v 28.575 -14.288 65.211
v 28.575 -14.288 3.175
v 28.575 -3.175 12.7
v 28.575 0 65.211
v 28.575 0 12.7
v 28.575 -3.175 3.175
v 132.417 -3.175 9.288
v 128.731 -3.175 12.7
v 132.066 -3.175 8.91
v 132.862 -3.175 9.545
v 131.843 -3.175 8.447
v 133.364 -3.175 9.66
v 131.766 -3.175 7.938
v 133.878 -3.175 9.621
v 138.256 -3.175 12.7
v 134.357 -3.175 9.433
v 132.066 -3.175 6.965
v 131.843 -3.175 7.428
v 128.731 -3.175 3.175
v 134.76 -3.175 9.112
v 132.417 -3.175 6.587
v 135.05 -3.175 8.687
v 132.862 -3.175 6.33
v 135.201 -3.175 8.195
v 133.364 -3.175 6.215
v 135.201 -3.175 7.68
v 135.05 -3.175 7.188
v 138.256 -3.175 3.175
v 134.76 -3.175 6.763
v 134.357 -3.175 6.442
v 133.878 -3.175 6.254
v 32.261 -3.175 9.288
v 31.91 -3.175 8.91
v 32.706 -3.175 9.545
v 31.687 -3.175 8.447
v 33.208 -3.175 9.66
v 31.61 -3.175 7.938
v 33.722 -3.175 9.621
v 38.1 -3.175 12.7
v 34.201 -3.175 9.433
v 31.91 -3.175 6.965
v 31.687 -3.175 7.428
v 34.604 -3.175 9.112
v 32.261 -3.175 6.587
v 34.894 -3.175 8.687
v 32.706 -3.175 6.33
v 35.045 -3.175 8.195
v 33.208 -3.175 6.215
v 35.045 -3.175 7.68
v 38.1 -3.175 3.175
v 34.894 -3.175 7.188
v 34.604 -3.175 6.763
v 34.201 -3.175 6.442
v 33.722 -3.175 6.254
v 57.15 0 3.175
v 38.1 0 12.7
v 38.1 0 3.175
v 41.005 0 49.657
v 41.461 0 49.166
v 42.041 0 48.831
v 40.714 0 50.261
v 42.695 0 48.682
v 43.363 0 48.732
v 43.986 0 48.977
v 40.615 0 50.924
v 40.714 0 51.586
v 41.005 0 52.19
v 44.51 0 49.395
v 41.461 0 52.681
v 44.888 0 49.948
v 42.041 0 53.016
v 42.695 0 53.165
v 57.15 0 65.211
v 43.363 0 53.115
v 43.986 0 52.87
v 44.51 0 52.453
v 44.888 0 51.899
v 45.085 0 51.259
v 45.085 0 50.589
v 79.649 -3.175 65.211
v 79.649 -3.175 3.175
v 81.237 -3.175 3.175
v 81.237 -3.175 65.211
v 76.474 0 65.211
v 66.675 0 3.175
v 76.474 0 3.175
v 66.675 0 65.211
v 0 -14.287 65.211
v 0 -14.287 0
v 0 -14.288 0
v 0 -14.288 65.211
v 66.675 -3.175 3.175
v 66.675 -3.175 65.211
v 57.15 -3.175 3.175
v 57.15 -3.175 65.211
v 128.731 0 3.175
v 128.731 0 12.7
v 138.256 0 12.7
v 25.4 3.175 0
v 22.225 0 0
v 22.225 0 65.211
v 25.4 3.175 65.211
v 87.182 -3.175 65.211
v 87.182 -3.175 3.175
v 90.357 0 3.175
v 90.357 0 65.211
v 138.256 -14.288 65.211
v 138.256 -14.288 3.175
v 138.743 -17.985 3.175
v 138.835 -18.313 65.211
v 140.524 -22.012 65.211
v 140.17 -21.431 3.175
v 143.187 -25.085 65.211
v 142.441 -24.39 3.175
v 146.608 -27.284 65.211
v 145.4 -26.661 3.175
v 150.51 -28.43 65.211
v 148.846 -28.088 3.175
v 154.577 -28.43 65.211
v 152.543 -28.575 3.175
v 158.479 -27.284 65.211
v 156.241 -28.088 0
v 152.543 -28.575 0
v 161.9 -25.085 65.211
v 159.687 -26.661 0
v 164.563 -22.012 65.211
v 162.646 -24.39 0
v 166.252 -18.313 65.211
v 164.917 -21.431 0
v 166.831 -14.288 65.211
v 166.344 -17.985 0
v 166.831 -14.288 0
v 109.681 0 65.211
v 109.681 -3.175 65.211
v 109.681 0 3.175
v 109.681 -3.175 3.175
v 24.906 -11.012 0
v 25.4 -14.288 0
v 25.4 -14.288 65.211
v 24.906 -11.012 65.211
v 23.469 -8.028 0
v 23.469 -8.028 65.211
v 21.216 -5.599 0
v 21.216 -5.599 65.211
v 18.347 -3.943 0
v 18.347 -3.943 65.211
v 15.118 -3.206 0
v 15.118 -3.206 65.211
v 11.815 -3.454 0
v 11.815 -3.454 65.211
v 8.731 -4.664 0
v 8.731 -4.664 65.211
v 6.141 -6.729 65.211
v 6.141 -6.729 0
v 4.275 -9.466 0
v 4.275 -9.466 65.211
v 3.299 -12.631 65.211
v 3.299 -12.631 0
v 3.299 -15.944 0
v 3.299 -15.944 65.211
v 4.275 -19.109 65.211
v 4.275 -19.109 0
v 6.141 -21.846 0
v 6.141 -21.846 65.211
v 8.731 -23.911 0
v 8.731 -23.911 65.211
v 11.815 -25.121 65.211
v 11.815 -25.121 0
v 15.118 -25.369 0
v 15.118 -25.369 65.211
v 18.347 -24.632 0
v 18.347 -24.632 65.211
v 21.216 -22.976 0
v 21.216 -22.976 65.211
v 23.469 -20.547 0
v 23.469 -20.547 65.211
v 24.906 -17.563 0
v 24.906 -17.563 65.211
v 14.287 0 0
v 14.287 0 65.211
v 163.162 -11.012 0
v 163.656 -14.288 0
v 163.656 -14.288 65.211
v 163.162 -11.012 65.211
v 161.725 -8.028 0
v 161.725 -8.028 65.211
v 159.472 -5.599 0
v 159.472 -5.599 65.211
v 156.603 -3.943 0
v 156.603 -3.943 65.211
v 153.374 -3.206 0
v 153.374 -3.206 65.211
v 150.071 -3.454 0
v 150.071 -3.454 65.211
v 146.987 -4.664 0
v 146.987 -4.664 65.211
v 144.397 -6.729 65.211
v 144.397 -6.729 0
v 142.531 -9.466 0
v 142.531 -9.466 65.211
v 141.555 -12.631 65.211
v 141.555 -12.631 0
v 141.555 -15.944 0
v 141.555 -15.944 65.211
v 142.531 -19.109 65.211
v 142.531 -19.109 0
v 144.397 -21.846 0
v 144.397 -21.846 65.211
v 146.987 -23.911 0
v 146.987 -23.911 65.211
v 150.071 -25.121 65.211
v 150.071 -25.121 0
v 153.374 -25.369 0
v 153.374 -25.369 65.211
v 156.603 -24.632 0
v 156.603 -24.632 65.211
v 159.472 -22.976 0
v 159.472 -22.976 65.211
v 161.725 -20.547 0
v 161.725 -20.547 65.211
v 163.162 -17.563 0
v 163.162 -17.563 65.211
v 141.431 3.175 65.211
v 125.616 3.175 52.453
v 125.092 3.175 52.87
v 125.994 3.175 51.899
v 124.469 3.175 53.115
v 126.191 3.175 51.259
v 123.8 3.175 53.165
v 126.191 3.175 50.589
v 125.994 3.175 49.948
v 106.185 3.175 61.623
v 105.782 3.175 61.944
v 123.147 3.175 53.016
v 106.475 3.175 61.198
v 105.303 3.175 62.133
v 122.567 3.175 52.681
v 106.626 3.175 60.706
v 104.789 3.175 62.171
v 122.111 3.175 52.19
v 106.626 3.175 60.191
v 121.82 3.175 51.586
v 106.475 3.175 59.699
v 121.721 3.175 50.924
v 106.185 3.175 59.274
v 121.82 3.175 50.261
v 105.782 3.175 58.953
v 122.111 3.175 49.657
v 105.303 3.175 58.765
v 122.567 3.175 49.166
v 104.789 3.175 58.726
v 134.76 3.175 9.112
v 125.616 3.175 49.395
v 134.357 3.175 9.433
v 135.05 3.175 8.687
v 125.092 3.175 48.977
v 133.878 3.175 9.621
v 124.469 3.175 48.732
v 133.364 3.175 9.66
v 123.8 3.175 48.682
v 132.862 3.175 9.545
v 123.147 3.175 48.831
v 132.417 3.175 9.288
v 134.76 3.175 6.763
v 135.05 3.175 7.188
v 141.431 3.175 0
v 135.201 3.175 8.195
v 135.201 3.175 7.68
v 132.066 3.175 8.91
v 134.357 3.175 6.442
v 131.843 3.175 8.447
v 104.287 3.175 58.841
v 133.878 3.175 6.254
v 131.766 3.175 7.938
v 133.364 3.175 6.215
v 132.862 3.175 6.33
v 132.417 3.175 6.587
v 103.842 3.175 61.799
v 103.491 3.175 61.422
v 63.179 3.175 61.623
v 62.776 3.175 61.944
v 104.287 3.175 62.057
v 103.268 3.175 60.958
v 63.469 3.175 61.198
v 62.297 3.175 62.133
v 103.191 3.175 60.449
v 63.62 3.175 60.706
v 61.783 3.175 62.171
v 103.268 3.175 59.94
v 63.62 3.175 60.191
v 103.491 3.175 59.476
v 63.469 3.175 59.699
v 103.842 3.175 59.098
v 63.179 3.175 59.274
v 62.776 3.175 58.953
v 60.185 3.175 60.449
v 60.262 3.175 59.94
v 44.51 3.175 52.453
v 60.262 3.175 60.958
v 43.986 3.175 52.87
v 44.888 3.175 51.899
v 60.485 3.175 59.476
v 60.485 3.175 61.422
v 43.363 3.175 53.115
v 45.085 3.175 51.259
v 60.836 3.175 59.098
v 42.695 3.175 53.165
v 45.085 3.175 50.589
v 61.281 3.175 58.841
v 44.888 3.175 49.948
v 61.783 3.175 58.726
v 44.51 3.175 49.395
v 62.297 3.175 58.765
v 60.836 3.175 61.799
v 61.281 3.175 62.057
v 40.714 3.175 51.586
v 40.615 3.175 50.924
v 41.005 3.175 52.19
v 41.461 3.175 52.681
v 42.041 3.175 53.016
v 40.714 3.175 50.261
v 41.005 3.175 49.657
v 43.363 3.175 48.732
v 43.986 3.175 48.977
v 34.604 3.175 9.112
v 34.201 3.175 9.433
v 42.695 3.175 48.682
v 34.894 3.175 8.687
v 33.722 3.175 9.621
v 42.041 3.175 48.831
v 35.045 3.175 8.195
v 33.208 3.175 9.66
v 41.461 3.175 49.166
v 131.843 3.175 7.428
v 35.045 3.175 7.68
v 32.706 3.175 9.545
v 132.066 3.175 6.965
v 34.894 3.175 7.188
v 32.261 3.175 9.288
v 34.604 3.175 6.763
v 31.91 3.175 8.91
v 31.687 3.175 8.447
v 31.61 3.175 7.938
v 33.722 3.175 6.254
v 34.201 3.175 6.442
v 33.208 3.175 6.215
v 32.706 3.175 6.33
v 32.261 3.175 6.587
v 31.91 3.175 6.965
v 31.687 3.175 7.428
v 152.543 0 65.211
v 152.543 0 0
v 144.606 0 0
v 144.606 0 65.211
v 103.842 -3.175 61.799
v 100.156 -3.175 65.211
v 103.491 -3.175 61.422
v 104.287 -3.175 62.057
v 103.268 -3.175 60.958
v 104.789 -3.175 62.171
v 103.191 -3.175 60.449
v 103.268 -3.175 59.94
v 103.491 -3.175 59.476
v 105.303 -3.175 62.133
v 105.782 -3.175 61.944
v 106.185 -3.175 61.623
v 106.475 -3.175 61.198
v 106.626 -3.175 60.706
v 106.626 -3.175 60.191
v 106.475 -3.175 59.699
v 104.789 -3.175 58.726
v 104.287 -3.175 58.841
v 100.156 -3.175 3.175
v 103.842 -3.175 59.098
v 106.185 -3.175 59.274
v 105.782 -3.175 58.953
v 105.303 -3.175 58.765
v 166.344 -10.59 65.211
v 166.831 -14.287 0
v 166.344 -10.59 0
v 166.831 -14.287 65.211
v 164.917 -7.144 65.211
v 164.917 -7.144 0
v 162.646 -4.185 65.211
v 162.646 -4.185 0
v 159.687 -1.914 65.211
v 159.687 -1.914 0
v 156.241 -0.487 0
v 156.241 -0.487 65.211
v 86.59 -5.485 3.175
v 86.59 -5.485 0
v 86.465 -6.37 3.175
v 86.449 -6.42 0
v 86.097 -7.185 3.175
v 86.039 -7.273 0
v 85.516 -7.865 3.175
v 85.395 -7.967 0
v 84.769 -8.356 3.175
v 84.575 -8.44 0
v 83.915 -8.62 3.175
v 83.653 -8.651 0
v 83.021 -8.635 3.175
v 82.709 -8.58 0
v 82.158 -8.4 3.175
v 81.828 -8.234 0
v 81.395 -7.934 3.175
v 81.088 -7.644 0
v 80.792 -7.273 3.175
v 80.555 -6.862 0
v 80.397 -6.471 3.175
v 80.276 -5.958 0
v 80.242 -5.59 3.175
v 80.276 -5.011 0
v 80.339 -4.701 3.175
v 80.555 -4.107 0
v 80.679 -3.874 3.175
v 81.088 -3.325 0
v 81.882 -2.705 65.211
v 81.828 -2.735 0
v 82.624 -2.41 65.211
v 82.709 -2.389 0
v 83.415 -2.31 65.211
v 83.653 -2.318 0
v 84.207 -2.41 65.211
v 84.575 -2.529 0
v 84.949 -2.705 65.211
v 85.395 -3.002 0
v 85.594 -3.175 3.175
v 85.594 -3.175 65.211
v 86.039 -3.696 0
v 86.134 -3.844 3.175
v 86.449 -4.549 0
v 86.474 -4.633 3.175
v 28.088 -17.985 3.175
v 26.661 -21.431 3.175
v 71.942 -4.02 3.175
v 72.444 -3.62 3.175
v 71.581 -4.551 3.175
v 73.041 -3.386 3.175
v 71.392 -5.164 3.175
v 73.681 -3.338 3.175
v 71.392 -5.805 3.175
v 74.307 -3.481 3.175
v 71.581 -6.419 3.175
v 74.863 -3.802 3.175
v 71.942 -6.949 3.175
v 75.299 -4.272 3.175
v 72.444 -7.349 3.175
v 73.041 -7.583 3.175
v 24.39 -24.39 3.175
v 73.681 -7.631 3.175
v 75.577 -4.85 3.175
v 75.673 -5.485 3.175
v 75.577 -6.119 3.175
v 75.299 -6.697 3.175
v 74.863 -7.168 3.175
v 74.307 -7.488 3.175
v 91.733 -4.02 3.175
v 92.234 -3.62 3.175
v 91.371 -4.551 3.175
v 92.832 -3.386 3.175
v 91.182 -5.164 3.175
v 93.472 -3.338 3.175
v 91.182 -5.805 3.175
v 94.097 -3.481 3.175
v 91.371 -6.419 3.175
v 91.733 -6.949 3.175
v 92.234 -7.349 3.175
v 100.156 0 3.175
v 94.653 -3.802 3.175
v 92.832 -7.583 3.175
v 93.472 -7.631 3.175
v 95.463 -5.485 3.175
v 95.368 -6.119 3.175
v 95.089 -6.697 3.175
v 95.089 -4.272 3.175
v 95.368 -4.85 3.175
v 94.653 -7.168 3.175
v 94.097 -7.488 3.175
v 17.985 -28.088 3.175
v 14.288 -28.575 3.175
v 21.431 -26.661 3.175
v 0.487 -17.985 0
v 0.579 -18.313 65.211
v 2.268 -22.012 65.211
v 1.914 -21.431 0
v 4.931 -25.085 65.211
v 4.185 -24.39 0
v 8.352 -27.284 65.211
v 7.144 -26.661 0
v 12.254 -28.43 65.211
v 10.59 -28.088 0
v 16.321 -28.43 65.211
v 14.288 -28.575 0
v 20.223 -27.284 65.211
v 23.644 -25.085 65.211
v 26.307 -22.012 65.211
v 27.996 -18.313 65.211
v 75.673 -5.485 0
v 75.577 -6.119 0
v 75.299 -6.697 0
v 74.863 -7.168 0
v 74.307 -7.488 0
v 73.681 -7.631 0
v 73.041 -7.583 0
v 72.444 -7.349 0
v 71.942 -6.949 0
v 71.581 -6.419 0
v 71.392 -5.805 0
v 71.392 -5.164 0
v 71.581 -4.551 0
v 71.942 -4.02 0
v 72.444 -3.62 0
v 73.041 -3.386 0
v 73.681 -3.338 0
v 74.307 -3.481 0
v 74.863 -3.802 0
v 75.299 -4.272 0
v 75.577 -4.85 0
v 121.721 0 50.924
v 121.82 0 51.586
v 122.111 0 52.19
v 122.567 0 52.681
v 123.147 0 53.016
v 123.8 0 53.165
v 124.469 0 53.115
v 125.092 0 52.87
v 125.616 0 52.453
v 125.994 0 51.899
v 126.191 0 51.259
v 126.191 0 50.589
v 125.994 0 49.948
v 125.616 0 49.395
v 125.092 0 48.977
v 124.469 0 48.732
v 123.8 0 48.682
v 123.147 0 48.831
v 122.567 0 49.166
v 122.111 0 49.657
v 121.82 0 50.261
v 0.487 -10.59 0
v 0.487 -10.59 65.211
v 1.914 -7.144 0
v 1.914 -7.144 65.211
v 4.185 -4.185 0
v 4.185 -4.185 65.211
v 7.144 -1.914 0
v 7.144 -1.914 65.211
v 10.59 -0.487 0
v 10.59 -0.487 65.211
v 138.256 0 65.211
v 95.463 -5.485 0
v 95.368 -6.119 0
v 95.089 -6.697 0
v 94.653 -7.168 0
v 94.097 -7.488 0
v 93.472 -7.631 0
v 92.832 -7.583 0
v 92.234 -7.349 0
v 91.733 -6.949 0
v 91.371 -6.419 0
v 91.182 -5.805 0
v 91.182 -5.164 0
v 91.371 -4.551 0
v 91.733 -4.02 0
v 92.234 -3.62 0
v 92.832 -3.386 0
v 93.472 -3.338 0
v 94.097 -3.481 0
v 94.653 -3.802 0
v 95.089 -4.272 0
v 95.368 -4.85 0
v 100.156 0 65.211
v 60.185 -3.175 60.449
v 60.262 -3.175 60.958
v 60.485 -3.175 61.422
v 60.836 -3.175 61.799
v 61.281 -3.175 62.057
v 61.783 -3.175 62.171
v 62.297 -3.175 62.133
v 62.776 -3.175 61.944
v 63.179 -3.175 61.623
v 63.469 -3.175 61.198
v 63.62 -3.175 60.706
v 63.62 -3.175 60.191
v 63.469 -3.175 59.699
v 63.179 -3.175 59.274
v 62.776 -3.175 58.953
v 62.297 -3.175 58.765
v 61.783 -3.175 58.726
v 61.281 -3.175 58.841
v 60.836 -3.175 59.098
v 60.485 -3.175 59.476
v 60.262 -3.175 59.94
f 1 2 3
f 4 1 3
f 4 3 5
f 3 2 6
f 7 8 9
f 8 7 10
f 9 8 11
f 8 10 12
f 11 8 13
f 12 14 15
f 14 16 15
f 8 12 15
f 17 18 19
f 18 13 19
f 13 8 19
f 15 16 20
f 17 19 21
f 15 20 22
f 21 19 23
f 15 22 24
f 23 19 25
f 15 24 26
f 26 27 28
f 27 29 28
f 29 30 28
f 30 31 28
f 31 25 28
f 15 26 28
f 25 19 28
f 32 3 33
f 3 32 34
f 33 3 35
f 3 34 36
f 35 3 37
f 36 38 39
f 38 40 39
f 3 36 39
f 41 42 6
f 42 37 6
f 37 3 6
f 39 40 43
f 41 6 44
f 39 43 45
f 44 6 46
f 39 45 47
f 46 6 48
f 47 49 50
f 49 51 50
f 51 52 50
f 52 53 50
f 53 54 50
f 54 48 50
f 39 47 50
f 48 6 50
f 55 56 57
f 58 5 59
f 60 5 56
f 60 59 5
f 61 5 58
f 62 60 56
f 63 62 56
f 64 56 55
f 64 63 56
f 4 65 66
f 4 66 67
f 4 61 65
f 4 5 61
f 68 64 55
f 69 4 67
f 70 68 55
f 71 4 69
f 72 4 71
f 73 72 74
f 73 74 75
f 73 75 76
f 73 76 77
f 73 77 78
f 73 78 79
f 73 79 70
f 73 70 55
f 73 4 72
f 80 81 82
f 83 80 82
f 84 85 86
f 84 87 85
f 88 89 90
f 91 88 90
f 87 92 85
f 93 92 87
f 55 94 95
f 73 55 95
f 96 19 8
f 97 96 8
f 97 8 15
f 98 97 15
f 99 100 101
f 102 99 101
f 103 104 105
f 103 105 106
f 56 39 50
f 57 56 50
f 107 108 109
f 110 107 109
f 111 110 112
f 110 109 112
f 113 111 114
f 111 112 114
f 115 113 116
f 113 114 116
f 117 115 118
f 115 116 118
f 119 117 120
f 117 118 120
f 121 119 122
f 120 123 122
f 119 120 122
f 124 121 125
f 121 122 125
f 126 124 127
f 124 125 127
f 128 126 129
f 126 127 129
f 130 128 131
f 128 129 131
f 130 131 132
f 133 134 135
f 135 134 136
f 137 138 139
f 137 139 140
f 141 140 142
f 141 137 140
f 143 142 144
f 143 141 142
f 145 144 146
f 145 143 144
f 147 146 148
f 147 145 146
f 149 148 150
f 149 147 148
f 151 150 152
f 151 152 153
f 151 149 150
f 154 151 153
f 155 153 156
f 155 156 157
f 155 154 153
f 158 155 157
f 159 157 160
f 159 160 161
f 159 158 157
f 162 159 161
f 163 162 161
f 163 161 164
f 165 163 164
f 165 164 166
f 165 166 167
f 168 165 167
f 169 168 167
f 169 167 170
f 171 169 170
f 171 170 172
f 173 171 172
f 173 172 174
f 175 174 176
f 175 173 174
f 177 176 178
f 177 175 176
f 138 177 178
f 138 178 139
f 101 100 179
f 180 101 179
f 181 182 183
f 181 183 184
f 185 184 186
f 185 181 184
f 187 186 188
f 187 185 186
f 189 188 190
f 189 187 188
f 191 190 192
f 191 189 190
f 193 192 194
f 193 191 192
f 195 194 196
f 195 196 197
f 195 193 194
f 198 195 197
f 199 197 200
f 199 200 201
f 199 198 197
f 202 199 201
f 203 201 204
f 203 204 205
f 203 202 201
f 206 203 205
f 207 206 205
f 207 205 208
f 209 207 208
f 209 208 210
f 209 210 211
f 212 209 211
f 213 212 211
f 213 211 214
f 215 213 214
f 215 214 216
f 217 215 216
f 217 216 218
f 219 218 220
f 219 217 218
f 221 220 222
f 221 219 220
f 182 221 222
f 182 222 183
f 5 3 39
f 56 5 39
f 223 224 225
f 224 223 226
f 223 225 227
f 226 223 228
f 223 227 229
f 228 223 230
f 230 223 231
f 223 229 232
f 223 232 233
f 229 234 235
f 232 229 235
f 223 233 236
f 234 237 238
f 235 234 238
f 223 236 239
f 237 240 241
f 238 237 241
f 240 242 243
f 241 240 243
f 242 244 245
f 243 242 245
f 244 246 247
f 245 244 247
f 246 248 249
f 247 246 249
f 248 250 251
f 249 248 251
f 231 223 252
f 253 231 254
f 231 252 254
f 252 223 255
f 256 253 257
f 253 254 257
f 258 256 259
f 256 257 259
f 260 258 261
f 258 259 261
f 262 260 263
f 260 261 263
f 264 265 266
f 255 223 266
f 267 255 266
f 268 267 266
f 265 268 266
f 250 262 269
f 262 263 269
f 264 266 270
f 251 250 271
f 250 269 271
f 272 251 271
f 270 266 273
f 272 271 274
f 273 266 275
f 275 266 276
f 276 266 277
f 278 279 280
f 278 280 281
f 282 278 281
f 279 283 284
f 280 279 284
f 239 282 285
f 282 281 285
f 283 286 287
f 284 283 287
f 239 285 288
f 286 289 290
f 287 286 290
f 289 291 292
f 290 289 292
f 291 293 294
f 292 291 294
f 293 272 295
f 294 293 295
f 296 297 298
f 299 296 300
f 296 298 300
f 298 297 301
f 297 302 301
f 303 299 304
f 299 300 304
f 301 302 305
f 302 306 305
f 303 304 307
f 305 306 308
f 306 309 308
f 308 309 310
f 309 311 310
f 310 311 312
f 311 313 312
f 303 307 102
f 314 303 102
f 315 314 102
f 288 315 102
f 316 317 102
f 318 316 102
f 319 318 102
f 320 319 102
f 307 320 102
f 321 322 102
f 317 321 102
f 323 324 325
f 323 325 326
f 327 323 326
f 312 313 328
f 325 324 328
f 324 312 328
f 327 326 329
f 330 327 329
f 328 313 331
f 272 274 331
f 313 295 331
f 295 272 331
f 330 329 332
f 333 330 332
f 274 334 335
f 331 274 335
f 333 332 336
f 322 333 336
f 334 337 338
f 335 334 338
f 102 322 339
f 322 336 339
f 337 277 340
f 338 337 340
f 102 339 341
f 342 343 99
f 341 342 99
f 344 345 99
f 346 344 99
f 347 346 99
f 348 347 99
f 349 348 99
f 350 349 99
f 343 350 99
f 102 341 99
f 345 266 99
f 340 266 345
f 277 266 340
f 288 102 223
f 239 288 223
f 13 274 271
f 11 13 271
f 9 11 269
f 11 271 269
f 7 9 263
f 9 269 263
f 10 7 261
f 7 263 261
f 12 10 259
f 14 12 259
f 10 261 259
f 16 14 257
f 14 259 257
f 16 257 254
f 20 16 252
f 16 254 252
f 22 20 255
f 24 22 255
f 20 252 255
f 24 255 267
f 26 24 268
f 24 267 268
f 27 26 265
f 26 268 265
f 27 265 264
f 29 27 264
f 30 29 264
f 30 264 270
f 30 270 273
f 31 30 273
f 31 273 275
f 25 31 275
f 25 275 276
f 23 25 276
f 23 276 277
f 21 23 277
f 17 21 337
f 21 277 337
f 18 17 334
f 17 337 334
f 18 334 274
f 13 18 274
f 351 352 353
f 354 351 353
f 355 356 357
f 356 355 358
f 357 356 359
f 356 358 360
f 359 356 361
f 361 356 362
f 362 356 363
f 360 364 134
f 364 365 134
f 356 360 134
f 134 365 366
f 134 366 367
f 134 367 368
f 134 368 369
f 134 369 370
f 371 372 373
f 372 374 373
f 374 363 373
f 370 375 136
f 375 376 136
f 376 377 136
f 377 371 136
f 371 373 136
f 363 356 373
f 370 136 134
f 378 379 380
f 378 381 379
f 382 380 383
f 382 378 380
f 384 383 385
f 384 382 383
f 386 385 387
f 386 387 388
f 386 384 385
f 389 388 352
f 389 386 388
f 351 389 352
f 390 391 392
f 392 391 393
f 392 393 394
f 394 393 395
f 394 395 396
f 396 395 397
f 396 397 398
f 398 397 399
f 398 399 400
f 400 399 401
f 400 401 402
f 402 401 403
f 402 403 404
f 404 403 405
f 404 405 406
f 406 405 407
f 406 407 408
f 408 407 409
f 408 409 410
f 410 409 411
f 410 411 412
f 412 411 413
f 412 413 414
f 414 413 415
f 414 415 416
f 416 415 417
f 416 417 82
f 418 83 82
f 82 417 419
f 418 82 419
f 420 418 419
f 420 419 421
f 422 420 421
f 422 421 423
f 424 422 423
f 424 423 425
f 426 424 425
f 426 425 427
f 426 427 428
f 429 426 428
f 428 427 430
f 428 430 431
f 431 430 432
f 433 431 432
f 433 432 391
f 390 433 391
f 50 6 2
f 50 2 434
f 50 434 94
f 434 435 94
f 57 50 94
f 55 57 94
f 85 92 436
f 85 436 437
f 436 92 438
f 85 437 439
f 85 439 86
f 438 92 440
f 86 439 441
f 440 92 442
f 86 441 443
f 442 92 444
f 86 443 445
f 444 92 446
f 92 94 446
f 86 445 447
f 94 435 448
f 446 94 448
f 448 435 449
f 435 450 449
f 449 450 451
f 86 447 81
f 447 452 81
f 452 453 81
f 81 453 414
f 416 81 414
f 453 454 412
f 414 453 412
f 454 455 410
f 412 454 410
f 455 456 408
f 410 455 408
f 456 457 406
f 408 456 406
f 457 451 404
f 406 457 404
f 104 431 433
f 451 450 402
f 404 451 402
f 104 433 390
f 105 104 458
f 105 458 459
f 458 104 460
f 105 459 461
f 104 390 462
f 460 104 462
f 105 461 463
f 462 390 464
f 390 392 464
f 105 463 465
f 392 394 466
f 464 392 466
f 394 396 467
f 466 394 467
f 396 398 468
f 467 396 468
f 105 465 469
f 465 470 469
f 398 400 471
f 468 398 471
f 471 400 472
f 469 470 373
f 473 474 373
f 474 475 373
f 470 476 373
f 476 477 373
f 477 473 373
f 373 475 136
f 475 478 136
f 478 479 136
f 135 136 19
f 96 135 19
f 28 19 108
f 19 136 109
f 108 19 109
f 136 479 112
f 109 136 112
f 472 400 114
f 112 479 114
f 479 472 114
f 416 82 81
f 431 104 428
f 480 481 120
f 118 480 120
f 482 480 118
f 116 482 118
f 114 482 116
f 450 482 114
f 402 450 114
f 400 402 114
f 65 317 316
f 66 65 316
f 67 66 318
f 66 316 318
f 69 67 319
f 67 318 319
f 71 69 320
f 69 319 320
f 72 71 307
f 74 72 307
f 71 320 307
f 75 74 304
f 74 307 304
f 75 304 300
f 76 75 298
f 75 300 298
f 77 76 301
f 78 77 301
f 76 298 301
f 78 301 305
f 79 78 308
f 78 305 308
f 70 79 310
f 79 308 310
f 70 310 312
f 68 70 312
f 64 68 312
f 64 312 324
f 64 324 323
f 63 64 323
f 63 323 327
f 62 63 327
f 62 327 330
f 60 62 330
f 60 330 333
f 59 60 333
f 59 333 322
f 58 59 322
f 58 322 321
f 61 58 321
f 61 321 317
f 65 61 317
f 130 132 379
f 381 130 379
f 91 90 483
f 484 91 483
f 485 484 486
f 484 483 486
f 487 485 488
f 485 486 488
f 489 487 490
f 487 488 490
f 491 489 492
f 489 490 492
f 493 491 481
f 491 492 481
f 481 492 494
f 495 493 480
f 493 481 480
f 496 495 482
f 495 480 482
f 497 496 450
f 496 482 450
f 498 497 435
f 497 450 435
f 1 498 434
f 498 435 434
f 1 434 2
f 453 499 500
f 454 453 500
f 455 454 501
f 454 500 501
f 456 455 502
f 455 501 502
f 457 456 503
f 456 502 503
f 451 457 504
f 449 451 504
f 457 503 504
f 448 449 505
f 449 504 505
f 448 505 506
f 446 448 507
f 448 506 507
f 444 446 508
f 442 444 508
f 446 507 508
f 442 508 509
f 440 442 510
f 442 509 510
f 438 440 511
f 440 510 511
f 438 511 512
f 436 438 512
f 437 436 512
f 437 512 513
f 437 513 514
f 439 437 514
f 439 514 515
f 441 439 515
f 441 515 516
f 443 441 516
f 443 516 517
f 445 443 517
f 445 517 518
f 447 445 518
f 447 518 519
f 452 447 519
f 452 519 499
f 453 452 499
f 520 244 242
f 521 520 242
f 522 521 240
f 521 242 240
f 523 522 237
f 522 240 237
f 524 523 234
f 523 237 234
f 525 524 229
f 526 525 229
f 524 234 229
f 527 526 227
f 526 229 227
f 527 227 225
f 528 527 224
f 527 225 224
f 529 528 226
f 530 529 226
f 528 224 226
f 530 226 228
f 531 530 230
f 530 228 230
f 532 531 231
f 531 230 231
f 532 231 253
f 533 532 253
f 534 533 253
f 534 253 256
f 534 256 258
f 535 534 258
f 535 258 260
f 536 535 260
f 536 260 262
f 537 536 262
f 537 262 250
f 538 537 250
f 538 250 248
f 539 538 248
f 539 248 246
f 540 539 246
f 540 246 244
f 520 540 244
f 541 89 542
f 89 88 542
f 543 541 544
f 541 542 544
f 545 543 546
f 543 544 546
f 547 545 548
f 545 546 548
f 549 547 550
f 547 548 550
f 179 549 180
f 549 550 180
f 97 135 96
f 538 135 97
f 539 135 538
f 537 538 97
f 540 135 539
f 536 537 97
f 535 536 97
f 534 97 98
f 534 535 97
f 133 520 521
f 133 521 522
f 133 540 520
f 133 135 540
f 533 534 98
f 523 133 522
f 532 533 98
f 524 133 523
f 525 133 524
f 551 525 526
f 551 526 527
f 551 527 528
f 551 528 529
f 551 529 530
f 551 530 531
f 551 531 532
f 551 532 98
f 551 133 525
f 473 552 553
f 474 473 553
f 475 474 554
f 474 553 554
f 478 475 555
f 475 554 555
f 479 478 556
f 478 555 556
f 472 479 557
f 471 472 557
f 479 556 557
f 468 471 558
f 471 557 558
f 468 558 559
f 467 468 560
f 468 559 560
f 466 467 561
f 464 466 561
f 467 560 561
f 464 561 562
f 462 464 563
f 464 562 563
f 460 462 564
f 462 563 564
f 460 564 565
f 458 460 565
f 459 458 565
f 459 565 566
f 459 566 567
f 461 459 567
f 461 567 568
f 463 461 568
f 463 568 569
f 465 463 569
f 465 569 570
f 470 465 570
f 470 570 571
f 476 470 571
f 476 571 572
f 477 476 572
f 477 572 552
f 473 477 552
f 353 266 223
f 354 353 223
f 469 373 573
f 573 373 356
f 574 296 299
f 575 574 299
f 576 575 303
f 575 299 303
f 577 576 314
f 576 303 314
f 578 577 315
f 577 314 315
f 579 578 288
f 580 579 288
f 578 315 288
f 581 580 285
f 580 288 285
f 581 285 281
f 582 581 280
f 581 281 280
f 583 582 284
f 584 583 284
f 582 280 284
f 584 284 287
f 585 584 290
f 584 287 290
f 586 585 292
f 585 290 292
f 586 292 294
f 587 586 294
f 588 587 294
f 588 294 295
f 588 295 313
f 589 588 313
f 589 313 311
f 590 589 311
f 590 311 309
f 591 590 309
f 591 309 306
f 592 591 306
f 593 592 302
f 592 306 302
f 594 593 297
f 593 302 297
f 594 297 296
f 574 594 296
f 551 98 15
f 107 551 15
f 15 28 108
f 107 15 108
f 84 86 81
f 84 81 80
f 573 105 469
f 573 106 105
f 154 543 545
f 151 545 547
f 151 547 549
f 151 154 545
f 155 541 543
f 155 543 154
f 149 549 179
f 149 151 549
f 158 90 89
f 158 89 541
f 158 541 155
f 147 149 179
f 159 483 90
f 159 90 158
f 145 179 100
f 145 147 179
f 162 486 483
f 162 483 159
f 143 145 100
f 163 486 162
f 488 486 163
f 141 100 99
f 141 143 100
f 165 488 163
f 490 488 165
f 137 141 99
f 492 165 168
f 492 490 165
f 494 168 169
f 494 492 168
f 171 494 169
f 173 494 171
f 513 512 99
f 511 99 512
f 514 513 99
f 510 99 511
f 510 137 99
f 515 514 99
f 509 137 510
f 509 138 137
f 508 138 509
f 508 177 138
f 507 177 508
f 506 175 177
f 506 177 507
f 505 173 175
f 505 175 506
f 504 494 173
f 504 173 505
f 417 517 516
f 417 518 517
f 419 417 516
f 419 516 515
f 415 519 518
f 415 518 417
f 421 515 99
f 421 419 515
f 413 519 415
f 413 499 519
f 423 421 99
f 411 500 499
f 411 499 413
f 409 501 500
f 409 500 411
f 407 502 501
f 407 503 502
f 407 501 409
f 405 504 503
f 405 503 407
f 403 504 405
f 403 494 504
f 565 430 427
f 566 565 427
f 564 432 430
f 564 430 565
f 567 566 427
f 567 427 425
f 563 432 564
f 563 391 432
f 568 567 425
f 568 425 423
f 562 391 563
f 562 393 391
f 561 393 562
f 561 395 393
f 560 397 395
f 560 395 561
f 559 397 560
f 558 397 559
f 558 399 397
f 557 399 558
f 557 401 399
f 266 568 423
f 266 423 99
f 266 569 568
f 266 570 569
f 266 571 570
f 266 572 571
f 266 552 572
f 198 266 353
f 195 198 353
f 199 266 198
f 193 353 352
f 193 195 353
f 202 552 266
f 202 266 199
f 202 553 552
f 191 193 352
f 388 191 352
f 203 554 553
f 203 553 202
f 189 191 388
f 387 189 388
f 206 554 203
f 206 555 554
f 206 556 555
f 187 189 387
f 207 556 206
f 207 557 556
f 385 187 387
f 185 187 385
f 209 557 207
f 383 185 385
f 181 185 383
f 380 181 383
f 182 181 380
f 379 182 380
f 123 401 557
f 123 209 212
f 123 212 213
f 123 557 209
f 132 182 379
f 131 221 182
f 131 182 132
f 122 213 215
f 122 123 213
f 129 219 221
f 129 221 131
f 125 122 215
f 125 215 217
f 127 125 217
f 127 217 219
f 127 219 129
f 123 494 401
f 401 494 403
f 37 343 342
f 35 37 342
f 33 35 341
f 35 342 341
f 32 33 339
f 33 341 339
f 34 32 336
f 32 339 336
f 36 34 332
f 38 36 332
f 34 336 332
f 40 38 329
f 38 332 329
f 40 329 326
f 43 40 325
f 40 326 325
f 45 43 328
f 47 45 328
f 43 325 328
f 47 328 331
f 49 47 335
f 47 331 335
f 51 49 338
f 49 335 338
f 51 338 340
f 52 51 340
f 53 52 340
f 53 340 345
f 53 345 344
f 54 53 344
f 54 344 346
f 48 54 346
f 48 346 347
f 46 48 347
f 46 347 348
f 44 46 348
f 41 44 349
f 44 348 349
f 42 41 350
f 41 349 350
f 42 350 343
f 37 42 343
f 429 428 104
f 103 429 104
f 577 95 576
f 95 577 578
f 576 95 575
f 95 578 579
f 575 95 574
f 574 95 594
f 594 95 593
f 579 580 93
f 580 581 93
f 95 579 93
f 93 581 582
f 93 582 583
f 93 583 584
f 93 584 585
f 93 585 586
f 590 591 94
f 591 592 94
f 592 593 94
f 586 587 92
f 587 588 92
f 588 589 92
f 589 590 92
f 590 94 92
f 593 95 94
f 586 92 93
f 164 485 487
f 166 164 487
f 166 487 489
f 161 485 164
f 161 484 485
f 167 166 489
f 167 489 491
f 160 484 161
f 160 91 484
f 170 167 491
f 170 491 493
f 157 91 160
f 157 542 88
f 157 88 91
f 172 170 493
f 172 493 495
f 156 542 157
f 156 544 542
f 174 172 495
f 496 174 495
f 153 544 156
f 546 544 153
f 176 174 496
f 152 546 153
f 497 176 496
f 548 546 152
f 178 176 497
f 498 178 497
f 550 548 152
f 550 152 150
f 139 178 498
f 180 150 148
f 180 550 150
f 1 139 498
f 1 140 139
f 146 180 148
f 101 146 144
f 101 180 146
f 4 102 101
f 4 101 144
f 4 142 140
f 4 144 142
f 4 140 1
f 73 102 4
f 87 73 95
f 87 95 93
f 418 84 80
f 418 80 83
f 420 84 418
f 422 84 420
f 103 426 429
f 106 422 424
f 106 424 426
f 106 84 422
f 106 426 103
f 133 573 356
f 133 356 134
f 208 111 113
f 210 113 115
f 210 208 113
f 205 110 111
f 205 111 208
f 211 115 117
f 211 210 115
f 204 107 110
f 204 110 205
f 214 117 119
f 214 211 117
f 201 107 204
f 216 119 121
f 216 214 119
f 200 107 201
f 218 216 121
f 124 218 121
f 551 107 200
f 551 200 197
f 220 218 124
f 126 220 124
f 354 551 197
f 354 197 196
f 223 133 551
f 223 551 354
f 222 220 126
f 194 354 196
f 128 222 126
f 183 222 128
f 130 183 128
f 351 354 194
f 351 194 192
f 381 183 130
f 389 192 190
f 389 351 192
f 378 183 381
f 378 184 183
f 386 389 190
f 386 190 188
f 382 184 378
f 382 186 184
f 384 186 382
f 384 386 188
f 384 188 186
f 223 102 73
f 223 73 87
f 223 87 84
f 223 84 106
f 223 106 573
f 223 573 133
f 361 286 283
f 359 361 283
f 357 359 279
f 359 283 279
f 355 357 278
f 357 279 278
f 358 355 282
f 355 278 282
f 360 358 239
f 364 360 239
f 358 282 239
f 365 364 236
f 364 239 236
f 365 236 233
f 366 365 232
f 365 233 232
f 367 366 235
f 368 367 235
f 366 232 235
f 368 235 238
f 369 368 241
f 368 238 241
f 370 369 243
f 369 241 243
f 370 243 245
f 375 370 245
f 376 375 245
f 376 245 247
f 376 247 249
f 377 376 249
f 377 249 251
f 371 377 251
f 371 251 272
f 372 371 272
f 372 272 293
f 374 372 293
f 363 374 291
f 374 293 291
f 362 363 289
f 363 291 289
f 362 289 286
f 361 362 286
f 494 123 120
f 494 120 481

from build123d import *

# Parameters (mm, degrees)
F0_R      = 11.1125
F1_DEPTH  = 65.211198
F3_DEPTH  = 3.175
F4_R      = 14.28749
F5_R      = 2.2479
F5_R_2    = 1.7272
F6_DEPTH  = 6.35
F7_R      = 3.175
F7_R_2    = 2.15265
F8_DEPTH  = 65.211198
F9_W      = 12.9742907321
F9_H      = 62.036198
F10_DEPTH = 3.175
F11_SIZE  = 3.17499


# Not quite as in the source:
# - a fillet or chamfer is up to 0.001 mm smaller than in the source, because OpenCascade refuses the exact size
# - a feature names something its author has since deleted; it is built from what else it names


with BuildPart() as f1:
    # F0 (on Top) → F1 (new body)
    with BuildSketch(Plane.XY):
        with BuildLine():
            Line((22.225, 0), (0, 0))
            Line((0, 0), (0, -14.2875))
            ThreePointArc((0, -14.2875), (14.2875, -28.575), (28.575, -14.2875))
            Line((28.575, -14.2875), (28.575, -3.175))
            Line((28.575, -3.175), (138.2559846, -3.175))
            Line((138.2559846, -3.175), (138.2559846, -14.2875))
            ThreePointArc((138.2559846, -14.2875), (152.5434846, -28.575), (166.8309846, -14.2875))
            Line((166.8309846, -14.2875), (166.8309846, 0))
            Line((166.8309846, 0), (144.6059846, 0))
            Line((144.6059846, 0), (144.6059846, 3.175))
            Line((144.6059846, 3.175), (22.225, 3.175))
            Line((22.225, 3.175), (22.225, 0))
        make_face()
        with Locations((14.2875, -14.2875)):
            Circle(F0_R, mode=Mode.SUBTRACT)
        with Locations((152.5434846, -14.2875)):
            Circle(F0_R, mode=Mode.SUBTRACT)
    extrude(amount=F1_DEPTH)

    # F2 (on face) → F3 (join)
    with BuildSketch(Plane(origin=(0, 0, 0), x_dir=(1, 0, 0), z_dir=(0, 0, -1))):
        with BuildLine():
            Line((152.5434846, 28.575), (14.2875, 28.575))
            ThreePointArc((14.2875, 28.575), (24.3902881362, 24.3902881362), (28.575, 14.2875))
            Line((28.575, 14.2875), (28.575, 3.175))
            Line((28.575, 3.175), (138.2559846, 3.175))
            Line((138.2559846, 3.175), (138.2559846, 14.2875))
            ThreePointArc((138.2559846, 14.2875), (142.4406964638, 24.3902881362), (152.5434846, 28.575))
        make_face()
    extrude(amount=-F3_DEPTH)

    # F4 (radius 14.2875 in the source; OpenCascade refuses exactly that, so slightly less here)
    f4_edges = [f1.edges().sort_by_distance(p)[0] for p in [
        (0, 0, 32.605599),
        (166.830985, 0, 32.605599),
    ]]
    fillet(f4_edges, radius=F4_R)

    # F5 (on face) → F6 (cut, through all)
    with BuildSketch(Plane(origin=(0, 3.175, 0), x_dir=(-1, 0, 0), z_dir=(0, 1, 0))):
        with Locations((-123.9684846, 50.923698)):
            Circle(F5_R)
        with Locations((-104.9184846, 60.448698)):
            Circle(F5_R_2)
        with Locations((-61.9125, 60.448698)):
            Circle(F5_R_2)
        with Locations((-42.8625, 50.923698)):
            Circle(F5_R)
        with Locations((-133.4934846, 7.9375)):
            Circle(F5_R_2)
        with Locations((-33.3375, 7.9375)):
            Circle(F5_R_2)
    extrude(amount=-F6_DEPTH, mode=Mode.SUBTRACT)

    # F7 (on face) → F8 (cut, through all)
    with BuildSketch(Plane(origin=(0, 0, 0), x_dir=(1, 0, 0), z_dir=(0, 0, -1))):
        with Locations((83.4154923, 5.4845204)):
            Circle(F7_R)
        with Locations((73.5203484069, 5.4845204)):
            Circle(F7_R_2)
        with Locations((93.3106361931, 5.4845204)):
            Circle(F7_R_2)
    extrude(amount=-F8_DEPTH, mode=Mode.SUBTRACT)

    # F9 (on face) → F10 (cut)
    with BuildSketch(Plane.XZ.offset(3.175)):
        Polygon((57.15, 65.211198), (28.575, 65.211198), (28.575, 12.7), (38.1, 12.7), (38.1, 3.175), (57.15, 3.175), align=None)
        Polygon((138.2559846, 12.7), (138.2559846, 65.211198), (109.6809846, 65.211198), (109.6809846, 3.175), (128.7309846, 3.175), (128.7309846, 12.7), align=None)
        with Locations((73.162145366, 34.193099)):
            Rectangle(F9_W, F9_H)
        with Locations((93.668839234, 34.193099)):
            Rectangle(F9_W, F9_H)
    extrude(amount=-F10_DEPTH, mode=Mode.SUBTRACT)

    # F11 (size 3.175 in the source; OpenCascade refuses exactly that, so slightly less here)
    f11_edges = [f1.edges().sort_by_distance(p)[0] for p in [
        (22.225, 3.175, 32.605599),
        (144.605985, 3.175, 32.605599),
        (87.181694, 0, 34.193099),
        (79.649291, 0, 34.193099),
    ]]
    chamfer(f11_edges, length=F11_SIZE)


solid = f1.part
